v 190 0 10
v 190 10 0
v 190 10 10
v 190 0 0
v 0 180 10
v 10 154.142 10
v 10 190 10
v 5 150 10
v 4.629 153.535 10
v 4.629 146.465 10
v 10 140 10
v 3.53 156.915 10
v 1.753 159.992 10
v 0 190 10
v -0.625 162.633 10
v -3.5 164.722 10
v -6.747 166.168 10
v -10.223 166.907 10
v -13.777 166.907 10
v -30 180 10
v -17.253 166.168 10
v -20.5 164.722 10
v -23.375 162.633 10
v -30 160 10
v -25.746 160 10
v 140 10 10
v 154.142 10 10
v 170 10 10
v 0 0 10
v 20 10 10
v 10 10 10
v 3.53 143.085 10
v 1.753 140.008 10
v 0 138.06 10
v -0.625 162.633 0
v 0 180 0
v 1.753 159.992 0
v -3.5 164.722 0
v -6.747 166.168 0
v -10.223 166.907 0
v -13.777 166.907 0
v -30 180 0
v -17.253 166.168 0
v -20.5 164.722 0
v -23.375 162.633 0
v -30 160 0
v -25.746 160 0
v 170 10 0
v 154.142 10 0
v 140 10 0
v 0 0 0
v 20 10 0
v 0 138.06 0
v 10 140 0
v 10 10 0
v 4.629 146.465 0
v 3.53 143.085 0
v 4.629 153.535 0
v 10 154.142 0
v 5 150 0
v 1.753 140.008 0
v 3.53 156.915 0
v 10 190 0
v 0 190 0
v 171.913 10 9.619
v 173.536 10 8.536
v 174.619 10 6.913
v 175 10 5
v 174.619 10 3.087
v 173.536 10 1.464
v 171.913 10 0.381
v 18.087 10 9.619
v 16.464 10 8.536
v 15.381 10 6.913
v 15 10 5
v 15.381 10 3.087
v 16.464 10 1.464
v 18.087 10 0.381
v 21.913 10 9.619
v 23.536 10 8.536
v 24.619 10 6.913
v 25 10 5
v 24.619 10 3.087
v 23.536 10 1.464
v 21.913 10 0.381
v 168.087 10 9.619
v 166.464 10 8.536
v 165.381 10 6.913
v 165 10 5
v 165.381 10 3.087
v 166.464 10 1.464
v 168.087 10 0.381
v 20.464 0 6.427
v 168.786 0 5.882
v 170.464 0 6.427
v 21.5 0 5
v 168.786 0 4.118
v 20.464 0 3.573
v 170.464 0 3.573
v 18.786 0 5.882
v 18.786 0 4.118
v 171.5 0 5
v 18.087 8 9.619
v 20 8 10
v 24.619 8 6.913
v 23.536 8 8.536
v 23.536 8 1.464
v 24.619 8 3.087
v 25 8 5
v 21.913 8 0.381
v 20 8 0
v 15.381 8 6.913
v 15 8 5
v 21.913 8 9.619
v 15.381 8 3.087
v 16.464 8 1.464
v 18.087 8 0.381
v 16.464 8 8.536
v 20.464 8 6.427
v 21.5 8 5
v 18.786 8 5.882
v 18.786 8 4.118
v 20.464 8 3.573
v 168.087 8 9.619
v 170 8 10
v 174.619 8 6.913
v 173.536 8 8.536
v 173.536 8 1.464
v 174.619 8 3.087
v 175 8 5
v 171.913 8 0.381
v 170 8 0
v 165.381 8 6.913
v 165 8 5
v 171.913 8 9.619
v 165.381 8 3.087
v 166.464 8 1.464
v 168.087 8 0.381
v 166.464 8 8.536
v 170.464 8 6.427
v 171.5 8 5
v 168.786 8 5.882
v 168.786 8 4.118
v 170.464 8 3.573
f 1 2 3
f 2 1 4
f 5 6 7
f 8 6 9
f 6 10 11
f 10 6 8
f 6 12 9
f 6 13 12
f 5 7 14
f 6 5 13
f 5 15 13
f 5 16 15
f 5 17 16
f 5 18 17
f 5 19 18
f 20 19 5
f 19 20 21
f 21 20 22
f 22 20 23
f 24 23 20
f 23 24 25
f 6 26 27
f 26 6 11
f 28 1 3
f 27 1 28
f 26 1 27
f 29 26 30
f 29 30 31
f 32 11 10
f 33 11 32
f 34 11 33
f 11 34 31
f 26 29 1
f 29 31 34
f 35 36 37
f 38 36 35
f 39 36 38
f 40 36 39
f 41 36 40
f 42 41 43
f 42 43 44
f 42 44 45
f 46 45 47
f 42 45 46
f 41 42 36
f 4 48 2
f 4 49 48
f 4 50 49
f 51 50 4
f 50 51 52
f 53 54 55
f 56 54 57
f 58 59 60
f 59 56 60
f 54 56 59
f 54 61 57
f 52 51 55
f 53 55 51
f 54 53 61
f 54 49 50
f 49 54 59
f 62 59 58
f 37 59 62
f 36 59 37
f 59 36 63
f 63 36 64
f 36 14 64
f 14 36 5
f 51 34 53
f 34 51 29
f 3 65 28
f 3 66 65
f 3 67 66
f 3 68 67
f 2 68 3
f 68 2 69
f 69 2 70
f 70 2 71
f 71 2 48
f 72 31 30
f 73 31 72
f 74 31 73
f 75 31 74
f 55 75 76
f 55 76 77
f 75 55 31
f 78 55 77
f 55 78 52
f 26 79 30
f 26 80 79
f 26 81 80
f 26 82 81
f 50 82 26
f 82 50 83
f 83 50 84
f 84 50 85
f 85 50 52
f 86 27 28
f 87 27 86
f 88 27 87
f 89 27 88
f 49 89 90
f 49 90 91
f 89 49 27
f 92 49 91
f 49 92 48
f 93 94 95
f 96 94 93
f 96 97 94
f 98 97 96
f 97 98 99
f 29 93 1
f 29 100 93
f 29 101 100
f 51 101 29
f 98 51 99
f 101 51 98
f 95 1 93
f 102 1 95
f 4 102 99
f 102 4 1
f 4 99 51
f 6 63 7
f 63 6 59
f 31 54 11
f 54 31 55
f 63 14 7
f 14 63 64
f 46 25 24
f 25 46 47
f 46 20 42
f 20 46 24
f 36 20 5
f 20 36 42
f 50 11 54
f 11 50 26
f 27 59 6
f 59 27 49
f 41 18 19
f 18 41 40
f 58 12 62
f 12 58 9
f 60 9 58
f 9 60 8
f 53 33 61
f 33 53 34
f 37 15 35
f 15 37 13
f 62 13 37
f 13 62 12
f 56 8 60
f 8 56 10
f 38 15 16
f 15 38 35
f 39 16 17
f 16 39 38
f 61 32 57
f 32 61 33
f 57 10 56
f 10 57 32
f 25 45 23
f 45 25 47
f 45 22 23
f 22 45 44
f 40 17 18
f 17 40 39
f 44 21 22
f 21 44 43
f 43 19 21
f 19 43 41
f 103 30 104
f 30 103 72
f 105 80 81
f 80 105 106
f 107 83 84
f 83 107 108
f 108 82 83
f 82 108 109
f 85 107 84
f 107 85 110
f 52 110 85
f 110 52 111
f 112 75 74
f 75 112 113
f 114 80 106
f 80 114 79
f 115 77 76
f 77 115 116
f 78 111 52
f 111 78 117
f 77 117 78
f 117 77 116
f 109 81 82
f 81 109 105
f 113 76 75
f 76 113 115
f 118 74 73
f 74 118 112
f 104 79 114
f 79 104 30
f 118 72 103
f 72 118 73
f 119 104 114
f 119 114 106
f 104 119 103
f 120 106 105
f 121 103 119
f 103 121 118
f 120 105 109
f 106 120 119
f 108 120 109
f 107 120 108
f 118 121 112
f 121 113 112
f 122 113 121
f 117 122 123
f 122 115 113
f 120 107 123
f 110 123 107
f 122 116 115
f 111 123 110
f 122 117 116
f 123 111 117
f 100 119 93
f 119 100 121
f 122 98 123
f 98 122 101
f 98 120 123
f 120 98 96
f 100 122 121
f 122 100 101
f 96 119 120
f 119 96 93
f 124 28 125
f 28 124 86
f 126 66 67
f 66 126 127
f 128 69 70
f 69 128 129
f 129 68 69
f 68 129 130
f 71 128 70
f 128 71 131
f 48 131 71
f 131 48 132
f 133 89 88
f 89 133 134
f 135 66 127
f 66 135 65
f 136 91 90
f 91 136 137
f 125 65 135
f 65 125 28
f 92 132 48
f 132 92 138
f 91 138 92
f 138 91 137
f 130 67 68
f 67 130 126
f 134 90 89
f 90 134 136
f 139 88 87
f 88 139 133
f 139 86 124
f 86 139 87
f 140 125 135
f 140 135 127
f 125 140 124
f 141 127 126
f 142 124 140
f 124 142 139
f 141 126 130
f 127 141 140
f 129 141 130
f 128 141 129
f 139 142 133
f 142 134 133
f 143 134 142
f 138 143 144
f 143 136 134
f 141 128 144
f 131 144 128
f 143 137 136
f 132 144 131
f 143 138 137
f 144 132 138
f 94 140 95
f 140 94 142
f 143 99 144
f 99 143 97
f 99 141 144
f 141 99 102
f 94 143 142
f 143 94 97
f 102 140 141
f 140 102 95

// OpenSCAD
// L-Bracket 3d Model
// written in openSCAD
//
// Description
// This is an l-bracket.
// The bracket should have two indentations for a 34mm dowel rod
//
// L-Bracket 3d Model
// written in OpenSCAD
//
// Description:
// This is an L-bracket.
// The bracket should have two indentations for a 34mm dowel rod.

// Parameters
bracket_thickness = 10;      // Thickness of the bracket walls (mm)
bracket_width = 10;         // Width of each arm (mm)
bracket_length = 150;        // Length of each arm (mm)
dowel_diameter = 34;        // Diameter of dowel rod (mm)
dowel_indent_depth = 8;     // Depth of indentation for dowel (mm)
dowel_indent_offset = 12;   // Distance from end to indentation center (mm)
screw_body_diameter = 3;        // Diameter of screw holes (mm)
screw_head_diameter = 10;

// Main L-bracket with two dowel indentations
module l_bracket() {
    union() {
        // Arm 1 (vertical)
        cube([bracket_length+screw_head_diameter*4, bracket_width, bracket_thickness]);
        // Arm 2 (horizontal), joined at one end to form an L
        translate([0, bracket_width - bracket_thickness, 0])
            cube([bracket_thickness, bracket_length+screw_head_diameter*4, bracket_thickness]);
        // Nubbin
        translate([bracket_thickness, bracket_length+screw_head_diameter, 0])
          rotate(90)
            cube([bracket_thickness*2, screw_head_diameter*4, bracket_thickness]);
        translate([bracket_length, bracket_width - bracket_thickness, 0])
          rotate(45)
            //cube([bracket_thickness, sqrt((2*(bracket_length/2)^2)), bracket_thickness]);
            cube([bracket_thickness, sqrt(2*bracket_length^2), bracket_thickness]);
    }
}


// // Indentation for dowel on each arm
module cylinder_indent(pos, rot, height, diameter) {
    translate(pos)
        rotate(rot)
            cylinder(h=height, d=diameter, center=false);
}

// // Indentation for dowel on each arm
module dowel_indent(pos, rot) {
    cylinder_indent(
        pos,
        rot,
        bracket_width,
        dowel_diameter
    );
}

// Assemble L-bracket with dowel indentations
difference() {
    l_bracket();
    // Indentation Outer
    #dowel_indent(
        [-dowel_indent_offset, bracket_length, 0],
        [0,0,0]
    );

    // Screw Head indent
    #cylinder_indent(
        [bracket_width*2, bracket_width-2, bracket_thickness/2],
        [-90, 0, 0],
        bracket_width*2,
        screw_head_diameter
    );

    #cylinder_indent(
        [bracket_width*2, 0, bracket_thickness/2],
        [-90, 0, 0],
        bracket_width*2,
        screw_body_diameter
    );

    // Screw Head indent
    #cylinder_indent(
        [bracket_length+screw_head_diameter*2, bracket_width-2, bracket_thickness/2],
        [-90, 0, 0],
        bracket_length,
        screw_head_diameter
    );

    // Screw Body indent
    #cylinder_indent(
        [bracket_length+screw_head_diameter*2, 0, bracket_thickness/2],
        [-90, 0, 0],
        bracket_length,
        screw_body_diameter
    );

}
